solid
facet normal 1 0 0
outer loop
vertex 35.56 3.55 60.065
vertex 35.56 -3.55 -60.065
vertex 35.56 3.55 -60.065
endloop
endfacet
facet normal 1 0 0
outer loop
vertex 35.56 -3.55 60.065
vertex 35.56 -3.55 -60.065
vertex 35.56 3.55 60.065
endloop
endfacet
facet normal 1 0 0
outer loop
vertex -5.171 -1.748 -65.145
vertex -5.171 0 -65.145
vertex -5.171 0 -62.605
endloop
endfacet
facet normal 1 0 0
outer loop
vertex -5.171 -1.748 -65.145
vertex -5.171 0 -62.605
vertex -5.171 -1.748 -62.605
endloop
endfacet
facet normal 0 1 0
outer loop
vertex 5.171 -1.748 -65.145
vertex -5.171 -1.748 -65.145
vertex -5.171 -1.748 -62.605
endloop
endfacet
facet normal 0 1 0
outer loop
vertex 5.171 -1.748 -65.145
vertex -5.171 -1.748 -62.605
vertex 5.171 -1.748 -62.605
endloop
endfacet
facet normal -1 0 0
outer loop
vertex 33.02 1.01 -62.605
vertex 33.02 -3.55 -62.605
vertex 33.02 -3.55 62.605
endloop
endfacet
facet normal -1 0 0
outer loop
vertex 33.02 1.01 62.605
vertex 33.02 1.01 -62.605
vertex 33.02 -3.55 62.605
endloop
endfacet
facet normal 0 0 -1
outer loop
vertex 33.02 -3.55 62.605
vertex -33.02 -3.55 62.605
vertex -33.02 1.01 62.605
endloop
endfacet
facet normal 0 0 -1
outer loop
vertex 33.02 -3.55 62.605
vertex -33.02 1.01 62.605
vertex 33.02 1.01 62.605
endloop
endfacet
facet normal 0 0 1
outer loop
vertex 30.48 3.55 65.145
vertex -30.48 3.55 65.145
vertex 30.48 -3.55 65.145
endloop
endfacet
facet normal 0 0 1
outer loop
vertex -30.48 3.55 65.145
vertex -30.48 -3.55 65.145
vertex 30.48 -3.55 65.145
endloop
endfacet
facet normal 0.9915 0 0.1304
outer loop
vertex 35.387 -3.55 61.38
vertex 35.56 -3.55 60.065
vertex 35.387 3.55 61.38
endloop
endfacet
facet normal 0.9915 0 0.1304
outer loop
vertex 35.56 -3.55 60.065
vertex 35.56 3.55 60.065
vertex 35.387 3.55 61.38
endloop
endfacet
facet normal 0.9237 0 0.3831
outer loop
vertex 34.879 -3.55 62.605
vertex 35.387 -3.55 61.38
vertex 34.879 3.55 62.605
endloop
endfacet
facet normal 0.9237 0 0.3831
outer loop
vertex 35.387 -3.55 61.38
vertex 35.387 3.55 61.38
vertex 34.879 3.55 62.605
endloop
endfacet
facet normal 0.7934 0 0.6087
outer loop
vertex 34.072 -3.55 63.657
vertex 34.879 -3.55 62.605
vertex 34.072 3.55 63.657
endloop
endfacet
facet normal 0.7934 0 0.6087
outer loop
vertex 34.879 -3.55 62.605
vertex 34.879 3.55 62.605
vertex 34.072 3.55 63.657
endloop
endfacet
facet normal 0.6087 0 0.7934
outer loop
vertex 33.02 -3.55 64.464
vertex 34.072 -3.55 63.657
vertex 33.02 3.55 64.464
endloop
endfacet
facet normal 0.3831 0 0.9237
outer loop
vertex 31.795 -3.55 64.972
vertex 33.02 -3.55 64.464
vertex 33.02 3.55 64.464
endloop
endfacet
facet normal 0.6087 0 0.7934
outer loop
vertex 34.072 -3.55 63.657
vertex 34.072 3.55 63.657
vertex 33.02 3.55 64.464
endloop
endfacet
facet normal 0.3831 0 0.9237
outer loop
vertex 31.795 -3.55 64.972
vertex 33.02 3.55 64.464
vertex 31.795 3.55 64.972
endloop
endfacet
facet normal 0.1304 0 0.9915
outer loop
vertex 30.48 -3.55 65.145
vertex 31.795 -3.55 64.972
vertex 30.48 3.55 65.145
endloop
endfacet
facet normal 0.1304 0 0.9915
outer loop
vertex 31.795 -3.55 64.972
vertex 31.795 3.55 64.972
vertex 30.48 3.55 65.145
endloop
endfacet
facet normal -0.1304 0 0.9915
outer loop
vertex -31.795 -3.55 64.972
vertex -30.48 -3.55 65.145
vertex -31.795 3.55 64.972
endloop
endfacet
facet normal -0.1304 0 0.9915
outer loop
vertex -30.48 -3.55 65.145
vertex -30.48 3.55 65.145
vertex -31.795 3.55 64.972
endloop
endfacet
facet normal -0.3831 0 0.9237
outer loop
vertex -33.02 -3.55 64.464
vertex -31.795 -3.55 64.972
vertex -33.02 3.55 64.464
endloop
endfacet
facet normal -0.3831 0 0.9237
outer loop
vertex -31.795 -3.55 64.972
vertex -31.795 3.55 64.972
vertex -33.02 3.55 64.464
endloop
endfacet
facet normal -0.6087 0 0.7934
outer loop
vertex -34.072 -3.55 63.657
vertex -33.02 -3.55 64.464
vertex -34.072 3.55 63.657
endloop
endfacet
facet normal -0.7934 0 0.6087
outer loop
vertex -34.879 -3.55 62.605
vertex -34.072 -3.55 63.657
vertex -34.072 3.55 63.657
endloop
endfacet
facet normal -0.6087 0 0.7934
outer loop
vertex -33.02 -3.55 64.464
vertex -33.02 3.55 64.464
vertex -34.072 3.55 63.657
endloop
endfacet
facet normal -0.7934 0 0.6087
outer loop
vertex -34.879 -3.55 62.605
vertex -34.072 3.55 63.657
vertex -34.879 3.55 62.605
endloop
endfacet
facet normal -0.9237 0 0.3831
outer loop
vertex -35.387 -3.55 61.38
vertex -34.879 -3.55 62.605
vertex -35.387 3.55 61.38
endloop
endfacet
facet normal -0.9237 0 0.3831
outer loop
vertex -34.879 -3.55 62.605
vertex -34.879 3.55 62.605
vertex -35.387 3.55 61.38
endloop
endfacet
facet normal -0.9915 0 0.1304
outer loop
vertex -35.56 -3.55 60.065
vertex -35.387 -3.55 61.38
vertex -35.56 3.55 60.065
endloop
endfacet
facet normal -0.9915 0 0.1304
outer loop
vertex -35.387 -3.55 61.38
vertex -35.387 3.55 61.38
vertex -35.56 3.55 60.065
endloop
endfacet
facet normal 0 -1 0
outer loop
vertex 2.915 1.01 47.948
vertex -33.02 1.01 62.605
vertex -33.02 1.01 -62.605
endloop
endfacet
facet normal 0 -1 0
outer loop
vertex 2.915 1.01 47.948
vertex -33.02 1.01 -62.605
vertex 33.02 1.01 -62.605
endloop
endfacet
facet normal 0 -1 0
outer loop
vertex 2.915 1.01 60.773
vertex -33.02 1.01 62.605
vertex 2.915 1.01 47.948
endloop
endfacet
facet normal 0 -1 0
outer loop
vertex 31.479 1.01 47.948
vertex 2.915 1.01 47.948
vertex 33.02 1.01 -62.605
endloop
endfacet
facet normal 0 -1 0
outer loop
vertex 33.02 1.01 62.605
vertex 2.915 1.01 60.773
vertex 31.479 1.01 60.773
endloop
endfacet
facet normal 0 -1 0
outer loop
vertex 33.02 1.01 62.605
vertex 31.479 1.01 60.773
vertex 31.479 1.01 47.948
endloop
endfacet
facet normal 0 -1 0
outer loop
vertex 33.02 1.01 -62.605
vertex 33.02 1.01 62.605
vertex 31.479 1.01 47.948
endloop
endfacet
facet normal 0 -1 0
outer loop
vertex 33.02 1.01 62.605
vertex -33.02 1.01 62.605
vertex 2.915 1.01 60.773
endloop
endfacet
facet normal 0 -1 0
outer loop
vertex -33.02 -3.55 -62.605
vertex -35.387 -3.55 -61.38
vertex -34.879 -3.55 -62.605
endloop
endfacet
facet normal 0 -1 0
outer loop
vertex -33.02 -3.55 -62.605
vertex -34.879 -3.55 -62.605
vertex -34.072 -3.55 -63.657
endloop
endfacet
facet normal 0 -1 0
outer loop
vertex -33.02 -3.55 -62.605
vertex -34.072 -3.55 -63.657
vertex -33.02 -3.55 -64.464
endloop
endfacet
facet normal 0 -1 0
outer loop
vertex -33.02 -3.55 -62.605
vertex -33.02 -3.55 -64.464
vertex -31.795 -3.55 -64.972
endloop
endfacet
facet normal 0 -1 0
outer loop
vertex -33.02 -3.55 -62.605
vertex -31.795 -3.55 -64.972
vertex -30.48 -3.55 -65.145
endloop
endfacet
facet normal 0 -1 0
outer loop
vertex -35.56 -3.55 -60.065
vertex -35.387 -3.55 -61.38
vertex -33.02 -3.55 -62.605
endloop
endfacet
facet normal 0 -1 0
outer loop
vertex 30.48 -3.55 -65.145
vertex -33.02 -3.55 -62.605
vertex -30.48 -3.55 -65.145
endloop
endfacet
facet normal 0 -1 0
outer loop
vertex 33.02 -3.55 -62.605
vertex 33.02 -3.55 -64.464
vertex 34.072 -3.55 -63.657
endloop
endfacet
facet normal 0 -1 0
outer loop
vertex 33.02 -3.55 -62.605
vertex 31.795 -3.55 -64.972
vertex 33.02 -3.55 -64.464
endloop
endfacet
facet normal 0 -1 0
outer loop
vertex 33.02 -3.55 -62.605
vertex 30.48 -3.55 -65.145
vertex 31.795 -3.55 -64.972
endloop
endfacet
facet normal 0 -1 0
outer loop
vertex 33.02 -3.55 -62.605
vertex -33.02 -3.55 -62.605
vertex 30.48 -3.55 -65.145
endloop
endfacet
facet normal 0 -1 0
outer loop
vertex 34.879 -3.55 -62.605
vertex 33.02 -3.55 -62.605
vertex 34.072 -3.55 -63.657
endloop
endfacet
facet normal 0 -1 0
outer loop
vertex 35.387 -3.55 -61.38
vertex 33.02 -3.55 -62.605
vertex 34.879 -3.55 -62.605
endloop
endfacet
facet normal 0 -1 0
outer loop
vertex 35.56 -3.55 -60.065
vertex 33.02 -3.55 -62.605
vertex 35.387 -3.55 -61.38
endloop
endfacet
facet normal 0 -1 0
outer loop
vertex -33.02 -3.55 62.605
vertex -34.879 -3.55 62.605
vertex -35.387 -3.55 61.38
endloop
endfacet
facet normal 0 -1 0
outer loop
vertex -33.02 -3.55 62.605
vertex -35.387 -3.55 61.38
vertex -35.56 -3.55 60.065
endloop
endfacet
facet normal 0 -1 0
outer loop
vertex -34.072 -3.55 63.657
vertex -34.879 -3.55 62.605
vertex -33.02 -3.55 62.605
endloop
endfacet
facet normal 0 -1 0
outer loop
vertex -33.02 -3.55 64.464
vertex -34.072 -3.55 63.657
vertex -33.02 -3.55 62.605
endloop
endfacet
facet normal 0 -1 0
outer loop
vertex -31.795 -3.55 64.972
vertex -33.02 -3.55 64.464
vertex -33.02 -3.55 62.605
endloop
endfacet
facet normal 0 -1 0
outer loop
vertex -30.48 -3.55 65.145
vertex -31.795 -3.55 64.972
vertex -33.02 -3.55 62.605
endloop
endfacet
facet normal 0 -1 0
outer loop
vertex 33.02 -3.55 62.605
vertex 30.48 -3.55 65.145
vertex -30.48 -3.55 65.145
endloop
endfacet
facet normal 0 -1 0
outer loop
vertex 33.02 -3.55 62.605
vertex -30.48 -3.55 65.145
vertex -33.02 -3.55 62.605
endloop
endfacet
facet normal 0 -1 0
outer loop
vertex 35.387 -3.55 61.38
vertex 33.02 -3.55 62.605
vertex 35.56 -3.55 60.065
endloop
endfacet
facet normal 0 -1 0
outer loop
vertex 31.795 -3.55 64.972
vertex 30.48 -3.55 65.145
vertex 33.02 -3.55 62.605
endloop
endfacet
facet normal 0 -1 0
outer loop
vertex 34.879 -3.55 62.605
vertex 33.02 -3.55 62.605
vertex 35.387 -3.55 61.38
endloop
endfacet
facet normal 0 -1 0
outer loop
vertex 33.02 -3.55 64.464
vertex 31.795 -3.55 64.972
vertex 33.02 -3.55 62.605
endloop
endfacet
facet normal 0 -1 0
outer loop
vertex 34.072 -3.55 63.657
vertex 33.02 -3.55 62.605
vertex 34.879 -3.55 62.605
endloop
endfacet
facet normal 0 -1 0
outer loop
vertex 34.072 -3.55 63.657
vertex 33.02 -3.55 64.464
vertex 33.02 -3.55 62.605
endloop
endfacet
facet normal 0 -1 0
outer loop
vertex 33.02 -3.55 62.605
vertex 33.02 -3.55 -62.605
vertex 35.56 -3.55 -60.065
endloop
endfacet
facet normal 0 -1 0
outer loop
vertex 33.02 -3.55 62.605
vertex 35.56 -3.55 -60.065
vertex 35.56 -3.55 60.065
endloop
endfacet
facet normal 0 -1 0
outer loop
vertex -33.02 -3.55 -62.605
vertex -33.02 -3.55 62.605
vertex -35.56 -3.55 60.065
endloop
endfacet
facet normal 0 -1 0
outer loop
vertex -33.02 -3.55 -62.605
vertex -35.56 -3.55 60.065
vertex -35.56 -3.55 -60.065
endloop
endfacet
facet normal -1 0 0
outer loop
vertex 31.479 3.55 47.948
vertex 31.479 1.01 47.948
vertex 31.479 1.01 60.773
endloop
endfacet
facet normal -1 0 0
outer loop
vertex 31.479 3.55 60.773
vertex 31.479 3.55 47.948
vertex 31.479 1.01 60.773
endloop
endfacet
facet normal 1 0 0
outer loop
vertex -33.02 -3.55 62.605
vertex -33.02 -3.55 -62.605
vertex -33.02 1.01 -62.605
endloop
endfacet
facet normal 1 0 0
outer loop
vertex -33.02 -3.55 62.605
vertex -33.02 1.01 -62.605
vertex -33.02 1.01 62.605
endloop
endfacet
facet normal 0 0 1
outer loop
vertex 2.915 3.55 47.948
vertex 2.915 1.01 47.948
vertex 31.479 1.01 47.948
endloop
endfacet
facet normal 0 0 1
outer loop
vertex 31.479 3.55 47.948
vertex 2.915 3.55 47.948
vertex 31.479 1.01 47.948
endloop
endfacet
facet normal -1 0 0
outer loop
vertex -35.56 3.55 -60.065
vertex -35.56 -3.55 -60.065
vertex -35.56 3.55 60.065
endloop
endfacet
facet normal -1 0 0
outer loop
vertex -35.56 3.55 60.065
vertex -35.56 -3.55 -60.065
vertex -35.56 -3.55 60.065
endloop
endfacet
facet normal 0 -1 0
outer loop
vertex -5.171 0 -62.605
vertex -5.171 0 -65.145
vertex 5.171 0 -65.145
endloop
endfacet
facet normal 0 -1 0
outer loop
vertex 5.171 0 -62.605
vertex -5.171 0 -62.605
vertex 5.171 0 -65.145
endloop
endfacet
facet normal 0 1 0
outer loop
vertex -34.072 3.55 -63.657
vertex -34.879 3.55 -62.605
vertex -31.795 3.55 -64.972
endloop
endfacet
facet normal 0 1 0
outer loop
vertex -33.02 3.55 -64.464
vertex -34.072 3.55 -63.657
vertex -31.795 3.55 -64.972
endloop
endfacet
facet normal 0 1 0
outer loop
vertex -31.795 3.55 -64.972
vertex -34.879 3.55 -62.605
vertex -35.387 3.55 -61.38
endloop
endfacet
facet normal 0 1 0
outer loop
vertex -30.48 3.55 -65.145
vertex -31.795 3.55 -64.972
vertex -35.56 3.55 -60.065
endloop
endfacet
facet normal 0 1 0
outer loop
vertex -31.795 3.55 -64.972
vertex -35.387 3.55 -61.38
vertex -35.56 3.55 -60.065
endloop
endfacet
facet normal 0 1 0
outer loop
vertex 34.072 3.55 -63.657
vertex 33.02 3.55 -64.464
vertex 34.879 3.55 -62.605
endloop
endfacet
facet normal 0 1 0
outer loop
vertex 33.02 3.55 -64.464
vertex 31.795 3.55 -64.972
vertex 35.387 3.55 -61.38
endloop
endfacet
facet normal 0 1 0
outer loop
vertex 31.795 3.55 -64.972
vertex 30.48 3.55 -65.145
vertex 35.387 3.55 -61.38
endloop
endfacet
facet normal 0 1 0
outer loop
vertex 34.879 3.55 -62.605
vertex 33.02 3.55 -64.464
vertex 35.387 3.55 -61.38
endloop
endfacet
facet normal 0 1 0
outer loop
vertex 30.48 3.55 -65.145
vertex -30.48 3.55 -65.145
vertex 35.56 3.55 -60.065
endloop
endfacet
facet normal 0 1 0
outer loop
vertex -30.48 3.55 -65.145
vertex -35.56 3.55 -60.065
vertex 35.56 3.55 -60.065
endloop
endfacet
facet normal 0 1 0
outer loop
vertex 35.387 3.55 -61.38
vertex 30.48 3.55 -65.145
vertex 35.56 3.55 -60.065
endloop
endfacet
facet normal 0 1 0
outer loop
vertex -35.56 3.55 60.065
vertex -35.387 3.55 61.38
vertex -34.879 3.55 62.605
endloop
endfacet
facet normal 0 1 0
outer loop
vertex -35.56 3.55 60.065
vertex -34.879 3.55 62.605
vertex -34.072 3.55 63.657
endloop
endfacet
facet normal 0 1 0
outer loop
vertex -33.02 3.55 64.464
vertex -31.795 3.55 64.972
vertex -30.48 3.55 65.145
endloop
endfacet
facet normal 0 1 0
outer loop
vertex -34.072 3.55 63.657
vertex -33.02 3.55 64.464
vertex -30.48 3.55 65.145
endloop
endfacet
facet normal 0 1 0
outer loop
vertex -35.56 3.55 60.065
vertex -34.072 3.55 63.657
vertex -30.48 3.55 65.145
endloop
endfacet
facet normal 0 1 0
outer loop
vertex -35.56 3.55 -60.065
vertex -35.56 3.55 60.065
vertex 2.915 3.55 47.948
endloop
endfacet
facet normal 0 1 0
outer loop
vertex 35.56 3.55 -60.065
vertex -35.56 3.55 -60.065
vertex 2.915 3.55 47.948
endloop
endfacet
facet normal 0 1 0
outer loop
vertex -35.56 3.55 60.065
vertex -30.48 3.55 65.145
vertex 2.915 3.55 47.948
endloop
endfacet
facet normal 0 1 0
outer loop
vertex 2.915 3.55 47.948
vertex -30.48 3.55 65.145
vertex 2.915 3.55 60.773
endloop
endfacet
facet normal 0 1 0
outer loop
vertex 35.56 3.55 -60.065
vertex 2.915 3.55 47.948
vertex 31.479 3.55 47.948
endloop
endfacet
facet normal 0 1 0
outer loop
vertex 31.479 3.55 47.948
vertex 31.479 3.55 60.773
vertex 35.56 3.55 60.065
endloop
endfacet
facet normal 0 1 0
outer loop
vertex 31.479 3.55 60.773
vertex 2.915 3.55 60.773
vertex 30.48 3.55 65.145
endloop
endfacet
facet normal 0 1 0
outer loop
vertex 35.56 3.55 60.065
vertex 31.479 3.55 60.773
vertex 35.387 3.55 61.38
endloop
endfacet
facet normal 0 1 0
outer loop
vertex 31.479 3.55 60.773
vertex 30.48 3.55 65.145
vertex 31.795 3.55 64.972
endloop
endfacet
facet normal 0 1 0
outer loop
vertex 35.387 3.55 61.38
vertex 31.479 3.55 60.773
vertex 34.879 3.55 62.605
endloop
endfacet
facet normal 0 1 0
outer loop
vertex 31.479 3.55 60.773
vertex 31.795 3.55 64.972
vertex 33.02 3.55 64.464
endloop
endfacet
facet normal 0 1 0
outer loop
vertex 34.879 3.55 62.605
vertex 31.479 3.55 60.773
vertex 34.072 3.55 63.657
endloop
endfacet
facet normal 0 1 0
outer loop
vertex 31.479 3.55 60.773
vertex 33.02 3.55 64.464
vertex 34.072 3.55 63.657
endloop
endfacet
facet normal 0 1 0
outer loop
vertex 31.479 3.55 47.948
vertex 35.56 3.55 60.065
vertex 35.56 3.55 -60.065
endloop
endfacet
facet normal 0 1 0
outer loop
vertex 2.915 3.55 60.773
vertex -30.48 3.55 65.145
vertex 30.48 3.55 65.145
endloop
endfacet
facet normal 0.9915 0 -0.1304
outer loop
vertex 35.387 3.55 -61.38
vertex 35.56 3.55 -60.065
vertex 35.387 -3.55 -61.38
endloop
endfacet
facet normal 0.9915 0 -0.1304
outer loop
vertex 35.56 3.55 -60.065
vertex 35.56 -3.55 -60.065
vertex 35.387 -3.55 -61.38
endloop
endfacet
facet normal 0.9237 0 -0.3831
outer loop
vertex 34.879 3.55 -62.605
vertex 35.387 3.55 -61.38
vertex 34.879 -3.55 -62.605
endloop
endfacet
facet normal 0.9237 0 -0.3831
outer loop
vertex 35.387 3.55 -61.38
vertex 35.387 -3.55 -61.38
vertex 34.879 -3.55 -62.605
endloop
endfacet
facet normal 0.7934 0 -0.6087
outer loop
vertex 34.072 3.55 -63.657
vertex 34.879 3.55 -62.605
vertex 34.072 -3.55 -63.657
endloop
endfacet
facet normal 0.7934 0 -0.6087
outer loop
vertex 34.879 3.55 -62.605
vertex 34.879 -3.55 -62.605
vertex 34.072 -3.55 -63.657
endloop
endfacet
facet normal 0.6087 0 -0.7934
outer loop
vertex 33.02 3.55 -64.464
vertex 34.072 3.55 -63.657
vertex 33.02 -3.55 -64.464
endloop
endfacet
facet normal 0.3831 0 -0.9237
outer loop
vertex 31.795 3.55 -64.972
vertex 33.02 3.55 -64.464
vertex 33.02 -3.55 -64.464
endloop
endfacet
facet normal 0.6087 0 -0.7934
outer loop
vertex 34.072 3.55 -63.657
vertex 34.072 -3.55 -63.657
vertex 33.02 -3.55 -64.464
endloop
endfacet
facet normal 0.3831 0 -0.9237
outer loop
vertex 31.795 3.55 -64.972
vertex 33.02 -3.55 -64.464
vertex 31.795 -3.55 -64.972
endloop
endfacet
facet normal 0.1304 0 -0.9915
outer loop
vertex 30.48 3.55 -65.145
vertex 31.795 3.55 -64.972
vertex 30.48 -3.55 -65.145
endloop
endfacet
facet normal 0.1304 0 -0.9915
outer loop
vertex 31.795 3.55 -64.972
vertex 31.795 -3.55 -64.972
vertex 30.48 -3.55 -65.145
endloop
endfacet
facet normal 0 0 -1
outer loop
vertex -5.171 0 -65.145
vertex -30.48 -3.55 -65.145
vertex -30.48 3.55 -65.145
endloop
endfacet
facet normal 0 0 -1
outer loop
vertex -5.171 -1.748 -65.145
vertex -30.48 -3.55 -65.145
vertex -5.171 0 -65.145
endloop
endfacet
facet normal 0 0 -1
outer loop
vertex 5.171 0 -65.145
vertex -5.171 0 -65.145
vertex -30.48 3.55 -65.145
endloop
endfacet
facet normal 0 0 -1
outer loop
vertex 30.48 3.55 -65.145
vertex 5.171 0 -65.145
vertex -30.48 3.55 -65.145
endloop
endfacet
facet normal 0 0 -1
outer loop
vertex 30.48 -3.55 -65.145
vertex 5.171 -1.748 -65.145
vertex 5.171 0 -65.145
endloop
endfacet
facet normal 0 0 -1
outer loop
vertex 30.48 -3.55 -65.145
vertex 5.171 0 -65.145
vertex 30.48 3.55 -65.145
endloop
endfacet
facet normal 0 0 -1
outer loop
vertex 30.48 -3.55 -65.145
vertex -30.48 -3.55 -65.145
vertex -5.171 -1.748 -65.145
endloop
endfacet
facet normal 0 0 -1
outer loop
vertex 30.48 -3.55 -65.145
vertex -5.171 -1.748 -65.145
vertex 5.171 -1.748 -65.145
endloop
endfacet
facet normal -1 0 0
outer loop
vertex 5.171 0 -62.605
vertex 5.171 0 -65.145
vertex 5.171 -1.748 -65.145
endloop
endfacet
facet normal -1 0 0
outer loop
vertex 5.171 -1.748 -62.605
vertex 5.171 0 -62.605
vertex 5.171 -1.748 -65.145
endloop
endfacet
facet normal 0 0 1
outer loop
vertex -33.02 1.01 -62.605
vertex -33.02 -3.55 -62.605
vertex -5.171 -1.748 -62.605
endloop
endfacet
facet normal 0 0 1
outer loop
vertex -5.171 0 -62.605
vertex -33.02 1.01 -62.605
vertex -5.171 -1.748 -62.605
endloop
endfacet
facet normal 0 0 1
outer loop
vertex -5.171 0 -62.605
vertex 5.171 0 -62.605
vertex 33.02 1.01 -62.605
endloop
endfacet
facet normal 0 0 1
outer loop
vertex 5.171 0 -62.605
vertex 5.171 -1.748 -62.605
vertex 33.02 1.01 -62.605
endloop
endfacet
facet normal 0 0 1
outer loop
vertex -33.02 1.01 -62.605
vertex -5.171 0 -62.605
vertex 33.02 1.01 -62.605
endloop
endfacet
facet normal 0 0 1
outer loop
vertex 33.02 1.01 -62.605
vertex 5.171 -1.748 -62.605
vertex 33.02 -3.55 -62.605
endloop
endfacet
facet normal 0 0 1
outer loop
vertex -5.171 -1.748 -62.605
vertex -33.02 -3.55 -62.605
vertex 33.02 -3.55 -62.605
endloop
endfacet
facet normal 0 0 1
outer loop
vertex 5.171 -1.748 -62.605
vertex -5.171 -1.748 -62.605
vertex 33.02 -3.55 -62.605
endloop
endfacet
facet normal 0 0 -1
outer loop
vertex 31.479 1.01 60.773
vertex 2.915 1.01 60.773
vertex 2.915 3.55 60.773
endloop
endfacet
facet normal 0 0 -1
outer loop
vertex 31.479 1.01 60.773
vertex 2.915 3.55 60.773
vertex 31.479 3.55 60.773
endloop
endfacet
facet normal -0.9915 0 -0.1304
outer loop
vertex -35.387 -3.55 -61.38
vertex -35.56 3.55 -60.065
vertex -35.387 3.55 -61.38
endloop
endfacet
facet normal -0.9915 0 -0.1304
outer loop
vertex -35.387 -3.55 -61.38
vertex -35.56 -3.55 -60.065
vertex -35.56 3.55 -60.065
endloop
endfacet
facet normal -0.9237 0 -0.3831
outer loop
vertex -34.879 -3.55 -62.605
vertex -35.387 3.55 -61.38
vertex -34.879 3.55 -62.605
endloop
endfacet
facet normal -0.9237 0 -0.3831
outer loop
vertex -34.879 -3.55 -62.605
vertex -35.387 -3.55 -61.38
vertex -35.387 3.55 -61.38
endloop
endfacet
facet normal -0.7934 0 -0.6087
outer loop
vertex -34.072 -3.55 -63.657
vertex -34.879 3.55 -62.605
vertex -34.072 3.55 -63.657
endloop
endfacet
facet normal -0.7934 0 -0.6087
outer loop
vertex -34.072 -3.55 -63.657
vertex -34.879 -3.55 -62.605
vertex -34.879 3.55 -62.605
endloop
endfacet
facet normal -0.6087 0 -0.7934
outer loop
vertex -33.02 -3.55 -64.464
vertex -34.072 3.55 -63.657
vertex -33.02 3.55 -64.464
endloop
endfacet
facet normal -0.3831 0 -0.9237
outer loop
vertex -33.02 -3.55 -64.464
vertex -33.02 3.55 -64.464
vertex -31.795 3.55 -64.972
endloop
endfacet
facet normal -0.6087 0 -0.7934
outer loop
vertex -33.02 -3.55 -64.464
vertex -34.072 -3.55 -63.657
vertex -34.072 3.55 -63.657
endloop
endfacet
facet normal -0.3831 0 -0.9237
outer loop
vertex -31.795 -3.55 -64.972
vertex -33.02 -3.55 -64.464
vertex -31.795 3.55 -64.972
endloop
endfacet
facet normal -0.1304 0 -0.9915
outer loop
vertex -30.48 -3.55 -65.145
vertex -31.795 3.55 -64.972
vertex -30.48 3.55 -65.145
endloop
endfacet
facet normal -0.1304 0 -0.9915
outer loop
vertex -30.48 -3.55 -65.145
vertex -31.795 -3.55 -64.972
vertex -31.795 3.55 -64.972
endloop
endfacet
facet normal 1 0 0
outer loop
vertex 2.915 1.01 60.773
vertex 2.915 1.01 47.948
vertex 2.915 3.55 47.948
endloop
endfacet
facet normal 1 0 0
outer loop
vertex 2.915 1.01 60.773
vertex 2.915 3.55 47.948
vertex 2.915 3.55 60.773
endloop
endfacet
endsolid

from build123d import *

# Parameters (mm, degrees)
F0_W     = 71.120002
F0_H     = 130.28951
F1_DEPTH = 3.55
F2_T     = -2.54
F3_R     = 5.08
F4_W     = 28.56459
F4_H     = 12.824923
F5_DEPTH = 12.5
F6_W     = 10.341828
F6_H     = 1.748307
F7_DEPTH = 12.5


with BuildPart() as f1:
    # F0 (on Front) → F1 (new body, symmetric)
    with BuildSketch(Plane.XZ):
        Rectangle(F0_W, F0_H)
    extrude(amount=F1_DEPTH, both=True)

    # F2
    f2_openings = [f1.faces().sort_by_distance(p)[0] for p in [
        (0, -3.55, 0),
    ]]
    offset(amount=F2_T, openings=f2_openings)

    # F3
    f3_edges = [f1.edges().sort_by_distance(p)[0] for p in [
        (35.560001, 0, 65.144755),
        (-35.560001, 0, 65.144755),
        (35.560001, 0, -65.144755),
        (-35.560001, 0, -65.144755),
    ]]
    fillet(f3_edges, radius=F3_R)

    # F4 (on face) → F5 (cut, symmetric)
    with BuildSketch(Plane.XZ.offset(-1.01)):
        with Locations((17.19705, 54.360166)):
            Rectangle(F4_W, F4_H)
    extrude(amount=F5_DEPTH, both=True, mode=Mode.SUBTRACT)

    # F6 (on face) → F7 (cut, symmetric)
    with BuildSketch(Plane(origin=(0, 0, -65.144755), x_dir=(1, 0, 0), z_dir=(0, 0, -1))):
        with Locations((0, 0.874153)):
            Rectangle(F6_W, F6_H)
    extrude(amount=F7_DEPTH, both=True, mode=Mode.SUBTRACT)


solid = f1.part
